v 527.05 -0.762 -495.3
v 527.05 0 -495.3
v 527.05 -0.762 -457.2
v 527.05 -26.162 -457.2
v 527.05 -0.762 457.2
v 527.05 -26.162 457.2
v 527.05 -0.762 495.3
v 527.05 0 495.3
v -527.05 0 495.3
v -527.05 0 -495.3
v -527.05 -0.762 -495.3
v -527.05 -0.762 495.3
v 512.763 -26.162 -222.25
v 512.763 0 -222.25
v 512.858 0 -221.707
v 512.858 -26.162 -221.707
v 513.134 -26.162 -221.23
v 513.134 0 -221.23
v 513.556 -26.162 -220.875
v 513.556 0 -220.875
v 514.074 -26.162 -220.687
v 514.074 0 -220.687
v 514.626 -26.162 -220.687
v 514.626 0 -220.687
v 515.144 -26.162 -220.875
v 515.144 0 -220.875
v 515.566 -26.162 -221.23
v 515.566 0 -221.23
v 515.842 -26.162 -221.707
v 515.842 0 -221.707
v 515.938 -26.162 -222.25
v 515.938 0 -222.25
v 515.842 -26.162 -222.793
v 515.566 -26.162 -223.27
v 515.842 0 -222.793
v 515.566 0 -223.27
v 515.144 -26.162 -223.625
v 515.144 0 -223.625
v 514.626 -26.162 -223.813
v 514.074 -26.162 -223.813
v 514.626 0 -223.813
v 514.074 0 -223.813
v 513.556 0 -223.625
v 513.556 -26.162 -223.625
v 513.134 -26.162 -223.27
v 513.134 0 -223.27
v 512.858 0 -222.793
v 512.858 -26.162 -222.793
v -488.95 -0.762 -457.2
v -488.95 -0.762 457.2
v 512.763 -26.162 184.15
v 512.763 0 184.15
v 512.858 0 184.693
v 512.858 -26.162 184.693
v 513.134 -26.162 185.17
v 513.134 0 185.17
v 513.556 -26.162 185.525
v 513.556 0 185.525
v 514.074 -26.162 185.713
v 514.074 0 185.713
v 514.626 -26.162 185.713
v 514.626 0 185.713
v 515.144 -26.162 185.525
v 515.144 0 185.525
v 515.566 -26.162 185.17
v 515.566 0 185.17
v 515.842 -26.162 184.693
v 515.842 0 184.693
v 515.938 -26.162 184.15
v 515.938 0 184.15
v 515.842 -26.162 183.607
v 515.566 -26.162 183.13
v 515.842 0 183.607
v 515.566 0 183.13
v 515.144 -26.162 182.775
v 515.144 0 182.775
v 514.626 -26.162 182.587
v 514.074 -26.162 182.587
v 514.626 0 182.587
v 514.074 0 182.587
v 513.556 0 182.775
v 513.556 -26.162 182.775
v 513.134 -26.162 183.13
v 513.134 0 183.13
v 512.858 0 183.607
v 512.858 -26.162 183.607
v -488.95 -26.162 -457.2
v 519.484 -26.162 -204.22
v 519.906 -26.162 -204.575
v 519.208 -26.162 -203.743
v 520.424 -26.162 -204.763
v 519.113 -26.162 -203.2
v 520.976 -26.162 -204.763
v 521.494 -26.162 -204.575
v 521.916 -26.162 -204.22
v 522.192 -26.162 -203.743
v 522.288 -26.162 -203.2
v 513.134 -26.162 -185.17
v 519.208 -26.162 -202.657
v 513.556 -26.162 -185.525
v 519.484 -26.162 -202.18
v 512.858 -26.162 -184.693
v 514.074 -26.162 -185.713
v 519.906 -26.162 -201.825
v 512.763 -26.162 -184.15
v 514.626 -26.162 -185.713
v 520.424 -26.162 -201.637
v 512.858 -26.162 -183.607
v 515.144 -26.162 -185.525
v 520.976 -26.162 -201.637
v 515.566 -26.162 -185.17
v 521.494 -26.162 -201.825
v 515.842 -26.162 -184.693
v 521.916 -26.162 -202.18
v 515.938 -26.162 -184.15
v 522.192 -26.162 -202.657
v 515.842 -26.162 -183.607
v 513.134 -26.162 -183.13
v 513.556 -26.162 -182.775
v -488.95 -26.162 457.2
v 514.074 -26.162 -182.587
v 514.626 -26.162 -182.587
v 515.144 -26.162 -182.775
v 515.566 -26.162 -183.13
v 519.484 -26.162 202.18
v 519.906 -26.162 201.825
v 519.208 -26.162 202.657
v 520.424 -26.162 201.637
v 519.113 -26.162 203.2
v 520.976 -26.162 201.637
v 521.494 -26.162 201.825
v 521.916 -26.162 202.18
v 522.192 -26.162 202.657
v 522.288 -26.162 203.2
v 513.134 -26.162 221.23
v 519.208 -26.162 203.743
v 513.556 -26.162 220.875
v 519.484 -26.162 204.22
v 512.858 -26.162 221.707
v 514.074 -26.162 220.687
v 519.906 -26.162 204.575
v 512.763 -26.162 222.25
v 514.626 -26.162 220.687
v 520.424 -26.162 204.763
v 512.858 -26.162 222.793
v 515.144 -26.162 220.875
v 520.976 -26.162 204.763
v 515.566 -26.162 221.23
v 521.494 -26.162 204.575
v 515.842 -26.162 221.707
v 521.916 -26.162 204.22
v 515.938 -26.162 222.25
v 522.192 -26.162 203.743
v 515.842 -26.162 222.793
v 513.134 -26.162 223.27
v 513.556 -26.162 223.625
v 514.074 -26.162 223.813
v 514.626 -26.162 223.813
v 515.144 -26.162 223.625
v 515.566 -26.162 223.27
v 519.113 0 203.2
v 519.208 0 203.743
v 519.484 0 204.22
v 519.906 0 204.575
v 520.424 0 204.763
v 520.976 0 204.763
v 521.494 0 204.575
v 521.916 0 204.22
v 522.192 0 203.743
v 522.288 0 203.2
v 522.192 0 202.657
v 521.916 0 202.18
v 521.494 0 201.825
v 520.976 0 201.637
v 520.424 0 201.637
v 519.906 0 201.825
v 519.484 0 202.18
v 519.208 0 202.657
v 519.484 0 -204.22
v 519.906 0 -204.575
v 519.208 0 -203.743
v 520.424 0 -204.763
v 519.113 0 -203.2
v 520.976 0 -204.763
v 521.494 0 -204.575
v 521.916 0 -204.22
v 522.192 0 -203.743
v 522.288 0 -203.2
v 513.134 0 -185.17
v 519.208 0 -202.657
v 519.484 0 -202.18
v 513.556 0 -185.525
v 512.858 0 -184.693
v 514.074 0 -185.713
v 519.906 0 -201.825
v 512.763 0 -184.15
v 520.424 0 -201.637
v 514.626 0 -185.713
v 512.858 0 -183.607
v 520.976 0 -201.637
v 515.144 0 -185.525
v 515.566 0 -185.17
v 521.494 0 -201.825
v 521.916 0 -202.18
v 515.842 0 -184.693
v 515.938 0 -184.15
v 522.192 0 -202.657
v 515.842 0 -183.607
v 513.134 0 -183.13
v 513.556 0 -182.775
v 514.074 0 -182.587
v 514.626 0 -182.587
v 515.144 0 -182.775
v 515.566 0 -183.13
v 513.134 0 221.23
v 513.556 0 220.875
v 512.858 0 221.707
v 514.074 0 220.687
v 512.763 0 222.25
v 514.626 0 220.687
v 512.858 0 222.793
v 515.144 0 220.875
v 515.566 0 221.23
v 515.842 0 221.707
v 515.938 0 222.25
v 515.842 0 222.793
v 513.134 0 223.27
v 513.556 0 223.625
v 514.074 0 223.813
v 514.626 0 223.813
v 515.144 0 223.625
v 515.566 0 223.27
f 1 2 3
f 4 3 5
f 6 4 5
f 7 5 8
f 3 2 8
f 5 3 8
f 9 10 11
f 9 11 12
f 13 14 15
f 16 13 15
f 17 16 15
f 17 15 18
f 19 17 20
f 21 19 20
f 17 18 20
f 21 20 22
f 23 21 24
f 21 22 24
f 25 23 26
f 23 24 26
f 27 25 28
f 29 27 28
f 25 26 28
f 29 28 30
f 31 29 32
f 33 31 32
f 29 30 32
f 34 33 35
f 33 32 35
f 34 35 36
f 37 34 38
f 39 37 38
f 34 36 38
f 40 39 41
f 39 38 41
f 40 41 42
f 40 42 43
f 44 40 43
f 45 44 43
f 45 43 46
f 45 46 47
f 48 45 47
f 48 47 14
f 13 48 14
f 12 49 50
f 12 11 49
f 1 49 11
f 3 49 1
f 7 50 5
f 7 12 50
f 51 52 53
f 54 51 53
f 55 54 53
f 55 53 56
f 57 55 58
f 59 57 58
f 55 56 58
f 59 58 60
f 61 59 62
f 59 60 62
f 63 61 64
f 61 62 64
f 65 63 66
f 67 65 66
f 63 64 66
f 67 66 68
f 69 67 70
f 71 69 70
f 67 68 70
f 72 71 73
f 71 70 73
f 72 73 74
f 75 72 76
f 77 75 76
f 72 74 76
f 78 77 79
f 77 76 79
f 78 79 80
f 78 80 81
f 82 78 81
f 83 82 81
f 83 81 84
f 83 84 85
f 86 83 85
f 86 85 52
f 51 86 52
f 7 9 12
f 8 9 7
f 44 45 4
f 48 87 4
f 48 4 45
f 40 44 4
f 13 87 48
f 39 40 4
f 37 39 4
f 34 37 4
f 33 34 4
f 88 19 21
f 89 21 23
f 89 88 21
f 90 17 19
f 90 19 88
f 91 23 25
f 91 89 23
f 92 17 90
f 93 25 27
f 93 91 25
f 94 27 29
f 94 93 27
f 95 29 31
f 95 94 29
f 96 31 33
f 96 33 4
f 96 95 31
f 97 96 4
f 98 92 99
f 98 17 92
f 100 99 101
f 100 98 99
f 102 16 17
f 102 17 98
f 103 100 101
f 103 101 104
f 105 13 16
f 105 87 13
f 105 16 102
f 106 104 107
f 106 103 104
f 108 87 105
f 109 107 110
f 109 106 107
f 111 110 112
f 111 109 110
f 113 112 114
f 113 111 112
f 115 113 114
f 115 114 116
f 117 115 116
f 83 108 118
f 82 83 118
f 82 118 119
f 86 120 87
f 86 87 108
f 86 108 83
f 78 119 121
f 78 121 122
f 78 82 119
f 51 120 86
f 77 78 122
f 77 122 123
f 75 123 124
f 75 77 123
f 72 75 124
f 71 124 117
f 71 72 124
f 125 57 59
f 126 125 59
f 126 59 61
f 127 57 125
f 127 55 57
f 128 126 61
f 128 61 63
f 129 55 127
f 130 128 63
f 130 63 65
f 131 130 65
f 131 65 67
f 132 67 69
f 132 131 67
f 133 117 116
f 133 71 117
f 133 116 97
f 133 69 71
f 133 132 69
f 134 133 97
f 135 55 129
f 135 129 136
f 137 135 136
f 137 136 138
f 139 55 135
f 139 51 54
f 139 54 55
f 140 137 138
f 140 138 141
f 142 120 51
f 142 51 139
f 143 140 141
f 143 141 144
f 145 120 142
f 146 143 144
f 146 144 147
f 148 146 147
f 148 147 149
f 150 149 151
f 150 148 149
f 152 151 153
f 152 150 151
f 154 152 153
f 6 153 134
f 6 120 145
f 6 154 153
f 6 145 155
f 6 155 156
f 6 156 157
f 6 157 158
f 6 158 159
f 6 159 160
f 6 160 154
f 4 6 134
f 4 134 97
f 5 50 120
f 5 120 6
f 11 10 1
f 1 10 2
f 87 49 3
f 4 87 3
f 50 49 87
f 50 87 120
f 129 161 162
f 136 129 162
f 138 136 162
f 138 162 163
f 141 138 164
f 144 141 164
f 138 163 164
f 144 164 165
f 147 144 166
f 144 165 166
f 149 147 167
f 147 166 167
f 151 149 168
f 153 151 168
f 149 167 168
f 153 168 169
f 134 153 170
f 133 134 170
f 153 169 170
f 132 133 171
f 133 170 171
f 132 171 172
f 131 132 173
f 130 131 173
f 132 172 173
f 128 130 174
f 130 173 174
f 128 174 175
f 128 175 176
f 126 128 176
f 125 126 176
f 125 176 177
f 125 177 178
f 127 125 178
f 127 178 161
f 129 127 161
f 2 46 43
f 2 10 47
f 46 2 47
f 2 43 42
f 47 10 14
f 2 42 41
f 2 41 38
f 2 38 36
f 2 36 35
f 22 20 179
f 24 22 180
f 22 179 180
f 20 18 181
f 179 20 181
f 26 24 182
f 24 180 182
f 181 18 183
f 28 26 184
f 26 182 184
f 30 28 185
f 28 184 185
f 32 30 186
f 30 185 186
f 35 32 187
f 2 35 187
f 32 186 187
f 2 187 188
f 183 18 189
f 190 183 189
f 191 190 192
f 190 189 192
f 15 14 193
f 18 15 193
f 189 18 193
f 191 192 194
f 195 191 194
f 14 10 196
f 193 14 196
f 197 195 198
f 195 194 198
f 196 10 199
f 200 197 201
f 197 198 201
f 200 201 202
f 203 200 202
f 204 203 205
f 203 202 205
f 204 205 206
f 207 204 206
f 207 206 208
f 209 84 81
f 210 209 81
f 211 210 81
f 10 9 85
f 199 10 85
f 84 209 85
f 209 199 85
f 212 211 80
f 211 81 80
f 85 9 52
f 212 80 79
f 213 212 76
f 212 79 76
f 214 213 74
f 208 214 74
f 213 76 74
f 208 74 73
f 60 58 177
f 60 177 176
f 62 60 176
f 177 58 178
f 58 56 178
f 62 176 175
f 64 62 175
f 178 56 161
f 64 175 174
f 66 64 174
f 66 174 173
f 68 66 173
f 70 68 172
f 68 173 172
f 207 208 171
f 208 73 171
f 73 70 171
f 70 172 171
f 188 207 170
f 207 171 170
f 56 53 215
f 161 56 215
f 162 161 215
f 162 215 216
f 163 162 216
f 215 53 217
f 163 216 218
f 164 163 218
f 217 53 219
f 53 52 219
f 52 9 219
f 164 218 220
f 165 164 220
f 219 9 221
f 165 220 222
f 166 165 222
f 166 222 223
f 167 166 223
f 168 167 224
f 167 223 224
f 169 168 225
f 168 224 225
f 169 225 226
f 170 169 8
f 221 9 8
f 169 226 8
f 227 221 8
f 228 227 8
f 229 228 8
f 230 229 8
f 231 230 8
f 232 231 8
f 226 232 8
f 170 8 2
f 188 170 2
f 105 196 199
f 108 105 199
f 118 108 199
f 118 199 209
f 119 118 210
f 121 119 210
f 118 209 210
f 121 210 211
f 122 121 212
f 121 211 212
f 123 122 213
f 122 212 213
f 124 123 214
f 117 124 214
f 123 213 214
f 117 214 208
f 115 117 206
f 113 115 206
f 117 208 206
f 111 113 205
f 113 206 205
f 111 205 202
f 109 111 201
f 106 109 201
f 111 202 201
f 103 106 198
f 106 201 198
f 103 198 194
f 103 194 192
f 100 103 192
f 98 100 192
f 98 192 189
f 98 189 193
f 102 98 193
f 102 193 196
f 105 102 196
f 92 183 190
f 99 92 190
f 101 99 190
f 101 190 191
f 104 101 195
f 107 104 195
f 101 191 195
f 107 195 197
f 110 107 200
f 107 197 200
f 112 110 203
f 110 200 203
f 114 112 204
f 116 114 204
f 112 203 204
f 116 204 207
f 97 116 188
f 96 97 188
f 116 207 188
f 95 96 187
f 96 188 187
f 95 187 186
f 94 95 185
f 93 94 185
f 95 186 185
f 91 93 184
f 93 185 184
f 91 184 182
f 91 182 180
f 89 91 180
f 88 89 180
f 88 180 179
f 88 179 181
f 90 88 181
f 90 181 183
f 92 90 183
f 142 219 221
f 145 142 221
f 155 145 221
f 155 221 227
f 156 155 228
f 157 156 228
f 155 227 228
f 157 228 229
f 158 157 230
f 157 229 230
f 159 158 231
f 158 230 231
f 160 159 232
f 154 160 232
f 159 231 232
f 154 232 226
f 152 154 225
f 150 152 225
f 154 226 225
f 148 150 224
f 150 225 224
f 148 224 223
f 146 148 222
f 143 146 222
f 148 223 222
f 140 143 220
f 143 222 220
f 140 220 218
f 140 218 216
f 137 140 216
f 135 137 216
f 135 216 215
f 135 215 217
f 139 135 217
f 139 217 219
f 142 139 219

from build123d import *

# Parameters (mm, degrees)
F0_W     = 1054.1
F0_H     = 990.6
F1_DEPTH = 0.762
F2_W     = 1016
F2_H     = 914.4
F3_DEPTH = 25.4
F4_R     = 1.5875
F5_DEPTH = 26.163


with BuildPart() as f1:
    # F0 (on Front) → F1 (new body)
    with BuildSketch(Plane.XZ):
        Rectangle(F0_W, F0_H)
    extrude(amount=F1_DEPTH)

    # F2 (on face) → F3 (join)
    with BuildSketch(Plane.XZ.offset(0.762)):
        with Locations((19.05, 0)):
            Rectangle(F2_W, F2_H)
    extrude(amount=F3_DEPTH)

    # F4 (on face) → F5 (cut, through all)
    with BuildSketch(Plane(origin=(0, 0, 0), x_dir=(-1, 0, 0), z_dir=(0, 1, 0))):
        with Locations((-520.7, 203.2)):
            Circle(F4_R)
        with Locations((-514.35, 222.25)):
            Circle(F4_R)
        with Locations((-514.35, 184.15)):
            Circle(F4_R)
        with Locations((-514.35, -184.15)):
            Circle(F4_R)
        with Locations((-520.7, -203.2)):
            Circle(F4_R)
        with Locations((-514.35, -222.25)):
            Circle(F4_R)
    extrude(amount=-F5_DEPTH, mode=Mode.SUBTRACT)


solid = f1.part
